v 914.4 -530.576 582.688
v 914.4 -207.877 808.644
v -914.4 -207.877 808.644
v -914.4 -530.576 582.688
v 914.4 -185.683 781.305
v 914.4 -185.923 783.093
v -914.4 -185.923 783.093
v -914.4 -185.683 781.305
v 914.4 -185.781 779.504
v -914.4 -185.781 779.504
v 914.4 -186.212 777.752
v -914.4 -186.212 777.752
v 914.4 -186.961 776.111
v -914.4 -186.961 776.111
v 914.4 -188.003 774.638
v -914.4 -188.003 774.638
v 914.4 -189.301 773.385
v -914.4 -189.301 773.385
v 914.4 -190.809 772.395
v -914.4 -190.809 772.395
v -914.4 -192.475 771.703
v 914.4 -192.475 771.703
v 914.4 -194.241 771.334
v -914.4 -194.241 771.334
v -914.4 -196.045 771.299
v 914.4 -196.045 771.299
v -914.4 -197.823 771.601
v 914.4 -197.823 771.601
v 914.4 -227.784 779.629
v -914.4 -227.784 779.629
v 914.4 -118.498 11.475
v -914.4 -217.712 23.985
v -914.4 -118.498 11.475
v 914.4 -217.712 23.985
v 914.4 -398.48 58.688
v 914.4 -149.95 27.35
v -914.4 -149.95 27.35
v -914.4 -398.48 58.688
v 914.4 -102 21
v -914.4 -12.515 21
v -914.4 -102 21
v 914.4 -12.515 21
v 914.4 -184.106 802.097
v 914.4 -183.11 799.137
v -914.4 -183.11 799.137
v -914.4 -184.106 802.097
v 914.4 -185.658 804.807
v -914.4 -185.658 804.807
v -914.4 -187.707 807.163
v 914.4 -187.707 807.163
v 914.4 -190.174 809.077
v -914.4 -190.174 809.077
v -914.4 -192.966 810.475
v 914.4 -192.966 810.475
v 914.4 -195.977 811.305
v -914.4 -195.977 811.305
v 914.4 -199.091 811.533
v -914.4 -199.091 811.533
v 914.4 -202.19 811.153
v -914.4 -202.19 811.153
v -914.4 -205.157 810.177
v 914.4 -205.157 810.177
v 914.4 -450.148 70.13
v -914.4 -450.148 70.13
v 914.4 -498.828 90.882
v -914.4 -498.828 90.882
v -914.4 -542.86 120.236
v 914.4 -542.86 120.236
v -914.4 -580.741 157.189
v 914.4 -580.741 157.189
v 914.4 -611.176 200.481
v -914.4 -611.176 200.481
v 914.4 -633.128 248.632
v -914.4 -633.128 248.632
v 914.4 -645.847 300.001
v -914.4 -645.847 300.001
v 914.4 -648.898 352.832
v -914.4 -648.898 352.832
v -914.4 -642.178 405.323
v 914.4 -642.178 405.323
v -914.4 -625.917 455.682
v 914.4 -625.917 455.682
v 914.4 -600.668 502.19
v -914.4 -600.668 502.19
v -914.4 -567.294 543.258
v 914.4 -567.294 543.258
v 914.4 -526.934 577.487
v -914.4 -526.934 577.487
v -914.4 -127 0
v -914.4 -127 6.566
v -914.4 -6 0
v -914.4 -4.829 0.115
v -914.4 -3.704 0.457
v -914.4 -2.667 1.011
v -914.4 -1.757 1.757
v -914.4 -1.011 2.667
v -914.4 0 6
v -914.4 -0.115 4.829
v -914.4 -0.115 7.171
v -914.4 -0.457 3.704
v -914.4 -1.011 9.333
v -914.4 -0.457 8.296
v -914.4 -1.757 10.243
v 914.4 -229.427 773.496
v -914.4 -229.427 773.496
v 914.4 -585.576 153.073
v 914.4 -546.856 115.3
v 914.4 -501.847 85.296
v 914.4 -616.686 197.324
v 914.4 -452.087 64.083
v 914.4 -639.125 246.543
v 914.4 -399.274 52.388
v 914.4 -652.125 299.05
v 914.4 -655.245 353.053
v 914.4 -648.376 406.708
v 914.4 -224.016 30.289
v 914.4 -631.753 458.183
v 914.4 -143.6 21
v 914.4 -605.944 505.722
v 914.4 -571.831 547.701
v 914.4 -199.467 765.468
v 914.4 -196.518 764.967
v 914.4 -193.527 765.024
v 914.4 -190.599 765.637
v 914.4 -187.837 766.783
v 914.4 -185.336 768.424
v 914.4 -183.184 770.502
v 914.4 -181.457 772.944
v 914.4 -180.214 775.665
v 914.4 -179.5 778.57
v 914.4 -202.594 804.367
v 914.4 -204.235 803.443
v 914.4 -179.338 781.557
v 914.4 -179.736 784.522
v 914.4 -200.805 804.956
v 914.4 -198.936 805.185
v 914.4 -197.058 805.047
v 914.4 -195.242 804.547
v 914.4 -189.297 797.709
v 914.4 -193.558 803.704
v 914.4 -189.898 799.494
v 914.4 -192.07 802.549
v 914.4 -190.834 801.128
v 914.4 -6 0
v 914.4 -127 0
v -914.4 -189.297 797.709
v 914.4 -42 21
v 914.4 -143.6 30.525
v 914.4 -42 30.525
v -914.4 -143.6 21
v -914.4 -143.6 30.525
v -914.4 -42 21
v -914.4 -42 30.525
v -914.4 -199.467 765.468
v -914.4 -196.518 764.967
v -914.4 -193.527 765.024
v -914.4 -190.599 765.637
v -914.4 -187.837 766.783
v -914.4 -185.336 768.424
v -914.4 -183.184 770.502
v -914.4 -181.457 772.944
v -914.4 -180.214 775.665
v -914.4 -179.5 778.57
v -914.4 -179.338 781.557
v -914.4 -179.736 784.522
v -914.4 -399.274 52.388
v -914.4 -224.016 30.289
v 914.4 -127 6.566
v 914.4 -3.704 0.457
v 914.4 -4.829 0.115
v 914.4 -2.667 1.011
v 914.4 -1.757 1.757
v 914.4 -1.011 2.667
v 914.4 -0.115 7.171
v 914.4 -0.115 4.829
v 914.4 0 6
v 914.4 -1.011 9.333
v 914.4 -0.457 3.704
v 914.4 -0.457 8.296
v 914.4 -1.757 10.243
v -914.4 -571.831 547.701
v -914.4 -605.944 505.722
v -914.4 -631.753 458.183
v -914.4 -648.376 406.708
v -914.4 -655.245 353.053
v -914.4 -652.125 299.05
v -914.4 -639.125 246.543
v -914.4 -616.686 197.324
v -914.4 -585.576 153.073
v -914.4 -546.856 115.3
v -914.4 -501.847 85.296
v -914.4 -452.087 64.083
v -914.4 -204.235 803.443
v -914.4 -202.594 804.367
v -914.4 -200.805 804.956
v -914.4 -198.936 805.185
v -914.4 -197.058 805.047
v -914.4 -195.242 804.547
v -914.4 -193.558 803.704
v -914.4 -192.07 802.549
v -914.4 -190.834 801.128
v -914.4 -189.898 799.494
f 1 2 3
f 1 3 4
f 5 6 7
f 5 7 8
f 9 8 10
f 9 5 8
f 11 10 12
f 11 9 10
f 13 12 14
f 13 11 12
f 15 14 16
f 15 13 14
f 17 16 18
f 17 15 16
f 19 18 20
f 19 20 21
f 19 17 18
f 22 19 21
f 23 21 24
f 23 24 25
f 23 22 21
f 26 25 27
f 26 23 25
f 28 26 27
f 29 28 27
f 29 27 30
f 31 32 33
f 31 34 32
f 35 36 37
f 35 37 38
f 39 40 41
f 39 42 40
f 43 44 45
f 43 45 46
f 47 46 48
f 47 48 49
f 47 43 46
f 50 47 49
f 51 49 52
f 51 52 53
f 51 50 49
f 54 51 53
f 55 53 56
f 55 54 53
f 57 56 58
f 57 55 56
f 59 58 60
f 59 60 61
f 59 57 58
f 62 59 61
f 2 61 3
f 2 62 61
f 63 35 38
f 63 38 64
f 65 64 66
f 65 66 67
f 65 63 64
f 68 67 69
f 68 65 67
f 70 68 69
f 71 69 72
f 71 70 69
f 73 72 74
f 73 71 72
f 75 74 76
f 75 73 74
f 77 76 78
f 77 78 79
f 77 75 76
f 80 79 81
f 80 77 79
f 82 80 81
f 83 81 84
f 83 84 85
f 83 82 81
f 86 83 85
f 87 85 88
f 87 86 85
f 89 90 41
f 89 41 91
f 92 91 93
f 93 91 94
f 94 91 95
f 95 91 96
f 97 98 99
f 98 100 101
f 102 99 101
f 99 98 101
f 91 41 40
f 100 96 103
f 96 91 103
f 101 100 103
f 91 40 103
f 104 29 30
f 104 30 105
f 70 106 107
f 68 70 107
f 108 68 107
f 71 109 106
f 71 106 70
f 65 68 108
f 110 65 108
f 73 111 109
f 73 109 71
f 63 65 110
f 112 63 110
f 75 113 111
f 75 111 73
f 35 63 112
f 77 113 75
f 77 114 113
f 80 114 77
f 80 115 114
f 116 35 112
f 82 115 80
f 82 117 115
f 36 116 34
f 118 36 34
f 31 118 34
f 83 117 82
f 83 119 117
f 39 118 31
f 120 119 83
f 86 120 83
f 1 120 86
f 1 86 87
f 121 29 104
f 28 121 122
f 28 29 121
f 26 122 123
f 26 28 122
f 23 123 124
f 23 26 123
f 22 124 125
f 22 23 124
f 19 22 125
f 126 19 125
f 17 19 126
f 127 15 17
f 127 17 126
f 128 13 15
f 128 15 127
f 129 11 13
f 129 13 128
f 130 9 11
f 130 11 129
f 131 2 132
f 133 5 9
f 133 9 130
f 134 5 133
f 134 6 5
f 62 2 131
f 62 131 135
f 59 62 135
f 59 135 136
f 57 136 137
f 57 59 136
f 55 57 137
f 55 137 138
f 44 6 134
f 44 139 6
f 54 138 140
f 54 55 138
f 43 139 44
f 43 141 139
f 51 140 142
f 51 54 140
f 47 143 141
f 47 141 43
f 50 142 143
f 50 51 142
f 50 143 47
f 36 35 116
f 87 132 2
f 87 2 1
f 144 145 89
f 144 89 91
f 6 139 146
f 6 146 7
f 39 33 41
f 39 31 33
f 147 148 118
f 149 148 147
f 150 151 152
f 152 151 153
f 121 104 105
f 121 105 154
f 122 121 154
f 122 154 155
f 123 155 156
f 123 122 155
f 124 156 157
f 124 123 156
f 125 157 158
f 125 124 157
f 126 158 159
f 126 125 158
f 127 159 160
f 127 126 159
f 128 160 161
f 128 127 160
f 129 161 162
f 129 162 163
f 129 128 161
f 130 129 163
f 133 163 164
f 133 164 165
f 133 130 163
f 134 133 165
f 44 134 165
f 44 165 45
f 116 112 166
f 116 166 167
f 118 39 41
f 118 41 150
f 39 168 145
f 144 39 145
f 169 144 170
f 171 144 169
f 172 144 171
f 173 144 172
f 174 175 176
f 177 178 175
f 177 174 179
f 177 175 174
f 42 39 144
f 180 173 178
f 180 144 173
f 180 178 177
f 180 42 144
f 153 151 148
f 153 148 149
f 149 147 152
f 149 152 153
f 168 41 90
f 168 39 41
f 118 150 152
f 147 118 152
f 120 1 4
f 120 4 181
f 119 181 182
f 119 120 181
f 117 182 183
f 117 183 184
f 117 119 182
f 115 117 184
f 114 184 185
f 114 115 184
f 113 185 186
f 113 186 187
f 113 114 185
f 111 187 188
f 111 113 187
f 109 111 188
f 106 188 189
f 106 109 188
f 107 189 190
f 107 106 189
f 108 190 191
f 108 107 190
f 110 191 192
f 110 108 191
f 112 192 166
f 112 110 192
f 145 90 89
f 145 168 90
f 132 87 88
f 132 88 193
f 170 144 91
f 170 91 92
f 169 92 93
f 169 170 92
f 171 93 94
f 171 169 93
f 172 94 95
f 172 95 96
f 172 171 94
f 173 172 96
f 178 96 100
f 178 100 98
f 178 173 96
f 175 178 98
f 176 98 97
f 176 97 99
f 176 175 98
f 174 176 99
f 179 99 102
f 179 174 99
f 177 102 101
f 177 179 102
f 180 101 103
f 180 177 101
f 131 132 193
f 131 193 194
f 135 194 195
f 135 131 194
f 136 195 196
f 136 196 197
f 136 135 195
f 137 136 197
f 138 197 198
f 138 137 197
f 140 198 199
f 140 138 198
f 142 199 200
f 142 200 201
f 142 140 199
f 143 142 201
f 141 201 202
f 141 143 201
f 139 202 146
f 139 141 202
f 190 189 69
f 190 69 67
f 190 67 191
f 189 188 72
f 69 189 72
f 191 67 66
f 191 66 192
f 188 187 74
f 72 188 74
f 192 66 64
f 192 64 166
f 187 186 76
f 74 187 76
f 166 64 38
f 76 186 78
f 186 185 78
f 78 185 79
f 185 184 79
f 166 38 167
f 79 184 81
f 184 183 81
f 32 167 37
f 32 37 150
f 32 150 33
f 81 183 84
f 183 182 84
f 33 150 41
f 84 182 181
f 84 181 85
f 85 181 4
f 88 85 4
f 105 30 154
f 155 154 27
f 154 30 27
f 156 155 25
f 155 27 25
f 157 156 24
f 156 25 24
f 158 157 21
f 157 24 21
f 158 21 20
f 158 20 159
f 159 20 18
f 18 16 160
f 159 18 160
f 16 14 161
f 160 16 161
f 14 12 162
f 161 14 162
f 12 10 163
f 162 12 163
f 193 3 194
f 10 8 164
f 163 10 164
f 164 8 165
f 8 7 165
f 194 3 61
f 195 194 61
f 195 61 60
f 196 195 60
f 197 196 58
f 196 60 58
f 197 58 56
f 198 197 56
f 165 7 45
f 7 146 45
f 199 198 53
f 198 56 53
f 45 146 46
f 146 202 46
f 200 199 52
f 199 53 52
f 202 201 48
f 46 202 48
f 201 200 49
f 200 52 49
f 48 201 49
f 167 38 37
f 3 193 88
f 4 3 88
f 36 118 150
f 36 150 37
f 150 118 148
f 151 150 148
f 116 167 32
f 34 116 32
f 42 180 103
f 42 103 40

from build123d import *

# Parameters (mm, degrees)
F1_DEPTH = 914.4
F2_W     = 101.6
F2_H     = 9.525
F3_DEPTH = 914.4
F5_DEPTH = 914.4


with BuildPart() as f1:
    # F0 (on Right) → F1 (new body, symmetric)
    with BuildSketch(Plane.YZ):
        with BuildLine():
            Line((-127, 6.566243), (-127, 0))
            Line((-127, 0), (-6, 0))
            ThreePointArc((-6, 0), (-0.456723, 3.703899), (-1.757359, 10.242641))
            Line((-1.757359, 10.242641), (-12.514719, 21))
            Line((-12.514719, 21), (-102, 21))
            Line((-102, 21), (-127, 6.566243))
        make_face()
    extrude(amount=F1_DEPTH, both=True)


with BuildPart() as f3:
    # F2 (on Right) → F3 (new body, symmetric)
    with BuildSketch(Plane.YZ):
        with Locations((-92.8, 25.7625)):
            Rectangle(F2_W, F2_H)
    extrude(amount=F3_DEPTH, both=True)


with BuildPart() as f5:
    # F4 (on Right) → F5 (new body, symmetric)
    with BuildSketch(Plane.YZ):
        with BuildLine():
            Line((-118.497784, 11.475), (-102, 21))
            Line((-102, 21), (-143.6, 21))
            Line((-143.6, 21), (-149.95, 27.35))
            Line((-149.95, 27.35), (-398.479945, 58.687657))
            ThreePointArc((-398.479945, 58.687657), (-640.676483, 274.022079), (-526.934011, 577.486617))
            Line((-526.934011, 577.486617), (-204.235092, 803.442833))
            ThreePointArc((-204.235092, 803.442833), (-195.241829, 804.547067), (-189.297408, 797.708794))
            Line((-189.297408, 797.708794), (-185.923142, 783.093243))
            ThreePointArc((-185.923142, 783.093243), (-188.62236, 773.980836), (-197.823417, 771.601281))
            Line((-197.823417, 771.601281), (-227.783864, 779.629158))
            Line((-227.783864, 779.629158), (-229.427365, 773.495529))
            Line((-229.427365, 773.495529), (-199.466918, 765.467652))
            ThreePointArc((-199.466918, 765.467652), (-184.21128, 769.413028), (-179.735892, 784.521682))
            Line((-179.735892, 784.521682), (-183.110158, 799.137233))
            ThreePointArc((-183.110158, 799.137233), (-192.966192, 810.475303), (-207.877302, 808.644449))
            Line((-207.877302, 808.644449), (-530.576222, 582.688233))
            ThreePointArc((-530.576222, 582.688233), (-646.840355, 272.495911), (-399.27434, 52.387543))
            Line((-399.27434, 52.387543), (-224.015868, 30.288838))
            Line((-224.015868, 30.288838), (-217.712179, 23.985149))
            Line((-217.712179, 23.985149), (-118.497784, 11.475))
        make_face()
    extrude(amount=F5_DEPTH, both=True)


solid = Compound([f1.part, f3.part, f5.part])
